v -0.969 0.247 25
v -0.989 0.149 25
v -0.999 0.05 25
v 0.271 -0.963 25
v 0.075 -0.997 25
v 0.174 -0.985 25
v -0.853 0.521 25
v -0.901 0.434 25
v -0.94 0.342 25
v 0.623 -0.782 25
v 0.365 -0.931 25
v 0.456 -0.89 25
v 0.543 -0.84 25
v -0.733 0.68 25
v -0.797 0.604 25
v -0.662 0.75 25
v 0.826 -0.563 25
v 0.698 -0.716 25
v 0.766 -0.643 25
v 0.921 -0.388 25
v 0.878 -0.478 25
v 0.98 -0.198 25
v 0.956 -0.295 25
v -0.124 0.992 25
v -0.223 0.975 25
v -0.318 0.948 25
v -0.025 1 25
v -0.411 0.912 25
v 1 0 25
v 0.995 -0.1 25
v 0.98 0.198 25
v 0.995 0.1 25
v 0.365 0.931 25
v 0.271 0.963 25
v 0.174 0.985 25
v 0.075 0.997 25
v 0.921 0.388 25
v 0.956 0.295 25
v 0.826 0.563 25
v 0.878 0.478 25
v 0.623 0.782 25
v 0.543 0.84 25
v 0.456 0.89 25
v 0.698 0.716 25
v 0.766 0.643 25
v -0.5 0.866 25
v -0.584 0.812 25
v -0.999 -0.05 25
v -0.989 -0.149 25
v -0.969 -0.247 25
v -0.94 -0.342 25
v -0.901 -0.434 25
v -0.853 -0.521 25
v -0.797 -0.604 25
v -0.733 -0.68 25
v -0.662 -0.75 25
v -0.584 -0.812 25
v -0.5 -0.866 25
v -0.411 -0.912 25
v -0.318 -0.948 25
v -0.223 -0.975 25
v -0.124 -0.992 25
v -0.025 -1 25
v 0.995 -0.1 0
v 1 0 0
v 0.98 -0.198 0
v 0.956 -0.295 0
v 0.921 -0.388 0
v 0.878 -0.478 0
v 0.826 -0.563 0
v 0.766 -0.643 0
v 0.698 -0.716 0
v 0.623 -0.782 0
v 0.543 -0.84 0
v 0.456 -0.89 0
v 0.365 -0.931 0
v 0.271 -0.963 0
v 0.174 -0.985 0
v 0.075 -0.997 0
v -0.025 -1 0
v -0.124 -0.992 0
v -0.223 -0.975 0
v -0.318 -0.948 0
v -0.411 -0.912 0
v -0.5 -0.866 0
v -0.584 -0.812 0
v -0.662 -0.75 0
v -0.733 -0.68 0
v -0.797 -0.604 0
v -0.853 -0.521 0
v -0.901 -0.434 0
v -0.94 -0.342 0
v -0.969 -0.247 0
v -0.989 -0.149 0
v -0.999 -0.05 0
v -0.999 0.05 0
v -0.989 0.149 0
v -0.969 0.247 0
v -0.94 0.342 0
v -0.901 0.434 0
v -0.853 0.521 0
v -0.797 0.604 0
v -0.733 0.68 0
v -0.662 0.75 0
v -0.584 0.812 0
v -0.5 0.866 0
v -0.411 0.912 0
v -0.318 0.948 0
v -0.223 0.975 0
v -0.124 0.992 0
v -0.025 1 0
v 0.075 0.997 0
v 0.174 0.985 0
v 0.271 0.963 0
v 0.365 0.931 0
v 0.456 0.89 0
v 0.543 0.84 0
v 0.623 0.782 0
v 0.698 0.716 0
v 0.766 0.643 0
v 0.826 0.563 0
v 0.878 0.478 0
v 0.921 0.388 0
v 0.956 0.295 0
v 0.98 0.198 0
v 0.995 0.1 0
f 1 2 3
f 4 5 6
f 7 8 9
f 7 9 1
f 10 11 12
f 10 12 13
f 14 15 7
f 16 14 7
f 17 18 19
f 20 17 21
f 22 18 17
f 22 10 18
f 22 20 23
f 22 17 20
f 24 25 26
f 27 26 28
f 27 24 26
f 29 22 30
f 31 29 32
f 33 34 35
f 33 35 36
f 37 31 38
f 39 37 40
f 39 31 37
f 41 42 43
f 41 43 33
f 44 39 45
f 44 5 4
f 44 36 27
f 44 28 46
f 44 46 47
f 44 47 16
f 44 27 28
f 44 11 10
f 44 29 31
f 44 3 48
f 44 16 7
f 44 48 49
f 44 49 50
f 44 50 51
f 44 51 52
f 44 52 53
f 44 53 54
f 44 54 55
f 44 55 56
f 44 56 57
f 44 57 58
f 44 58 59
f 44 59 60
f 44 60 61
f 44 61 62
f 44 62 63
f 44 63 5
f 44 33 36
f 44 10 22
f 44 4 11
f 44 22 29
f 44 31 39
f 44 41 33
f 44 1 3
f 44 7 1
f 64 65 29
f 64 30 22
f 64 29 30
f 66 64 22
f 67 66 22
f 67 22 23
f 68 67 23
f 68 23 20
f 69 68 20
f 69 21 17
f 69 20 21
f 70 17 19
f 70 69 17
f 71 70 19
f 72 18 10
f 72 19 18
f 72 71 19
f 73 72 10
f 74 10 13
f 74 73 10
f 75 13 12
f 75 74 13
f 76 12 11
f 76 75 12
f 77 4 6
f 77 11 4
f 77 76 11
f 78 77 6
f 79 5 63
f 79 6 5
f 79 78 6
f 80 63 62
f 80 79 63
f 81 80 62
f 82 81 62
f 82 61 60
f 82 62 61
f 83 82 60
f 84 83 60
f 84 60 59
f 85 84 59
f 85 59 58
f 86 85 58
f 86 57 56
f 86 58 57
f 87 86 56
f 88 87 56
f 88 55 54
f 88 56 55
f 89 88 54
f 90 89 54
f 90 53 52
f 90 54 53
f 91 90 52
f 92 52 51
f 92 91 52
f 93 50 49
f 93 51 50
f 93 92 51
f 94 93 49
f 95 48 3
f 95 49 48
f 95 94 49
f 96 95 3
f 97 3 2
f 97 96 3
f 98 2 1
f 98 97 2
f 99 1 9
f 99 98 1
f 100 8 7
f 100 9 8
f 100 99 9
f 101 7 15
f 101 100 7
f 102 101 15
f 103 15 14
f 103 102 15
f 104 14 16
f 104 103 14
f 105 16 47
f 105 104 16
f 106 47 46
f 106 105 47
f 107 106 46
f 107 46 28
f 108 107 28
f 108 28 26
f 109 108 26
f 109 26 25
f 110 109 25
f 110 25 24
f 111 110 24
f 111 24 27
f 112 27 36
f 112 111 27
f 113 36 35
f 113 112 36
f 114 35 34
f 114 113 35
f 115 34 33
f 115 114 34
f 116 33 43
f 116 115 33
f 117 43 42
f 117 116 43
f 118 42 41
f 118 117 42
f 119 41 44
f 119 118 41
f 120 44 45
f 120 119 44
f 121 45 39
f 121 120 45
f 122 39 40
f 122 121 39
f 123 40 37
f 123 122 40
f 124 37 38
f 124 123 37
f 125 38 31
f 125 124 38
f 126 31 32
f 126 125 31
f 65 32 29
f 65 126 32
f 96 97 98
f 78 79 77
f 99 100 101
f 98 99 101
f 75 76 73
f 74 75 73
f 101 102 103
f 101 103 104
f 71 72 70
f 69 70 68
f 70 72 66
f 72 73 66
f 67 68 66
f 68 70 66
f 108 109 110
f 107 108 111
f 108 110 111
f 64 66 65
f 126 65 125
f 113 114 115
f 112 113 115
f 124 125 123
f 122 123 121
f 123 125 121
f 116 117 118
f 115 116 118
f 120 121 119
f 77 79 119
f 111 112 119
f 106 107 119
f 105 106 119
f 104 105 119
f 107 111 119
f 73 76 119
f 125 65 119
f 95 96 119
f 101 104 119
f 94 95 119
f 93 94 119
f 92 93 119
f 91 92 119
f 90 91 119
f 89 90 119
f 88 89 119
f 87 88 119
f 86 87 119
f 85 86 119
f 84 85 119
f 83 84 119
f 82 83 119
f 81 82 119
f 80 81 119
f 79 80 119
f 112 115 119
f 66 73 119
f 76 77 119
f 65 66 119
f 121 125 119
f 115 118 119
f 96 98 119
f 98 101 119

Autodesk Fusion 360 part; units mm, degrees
sketch "Boceto1" plane through (0, 0, 0) normal (0, 0, 1) x (1, 0, 0)
  line L0 (0, 0) -> (120, 0)
  line L1 (120, 0) -> (120, 50)
  line L2 (120, 50) -> (0, 50)
  line L3 (0, 50) -> (0, 0)
  dimension "d1" = 120
  dimension "d2" = 50
extrude "Extruir1" add sketch "Boceto1" along normal blind 3
sketch "Boceto2" plane through (0, 0, 3) normal (0, 0, 1) x (-1, 0, 0)
  line L0 (0, -50) -> (0, 0)
  line L1 (0, 0) -> (-120, 0)
  line L2 (-120, 0) -> (-120, -50)
  line L3 (-120, -50) -> (0, -50)
  line L4 (-120, -25) -> (0, -25)
  line L5 (-120, -25) -> (-100, -25)
  circle A0 centre (-100, -25) radius 3
  line L6 (-100, -25) -> (-83.13, -25)
  circle A1 centre (-83.13, -25) radius 3
  line L7 (-83.13, -25) -> (-66.26, -25)
  circle A2 centre (-66.26, -25) radius 3
  line L8 (-66.26, -25) -> (-49.39, -25)
  circle A3 centre (-49.39, -25) radius 3
  line L9 (-49.39, -25) -> (-32.52, -25)
  circle A4 centre (-32.52, -25) radius 3
  line L10 (-32.52, -25) -> (-15.65, -25)
  circle A5 centre (-15.65, -25) radius 3
  dimension "d5" = 20
  dimension "d6" = 6
  dimension "d7" = 16.87
  dimension "d8" = 6
  dimension "d9" = 16.87
  dimension "d11" = 6
  dimension "d12" = 16.87
  dimension "d13" = 6
  dimension "d14" = 16.87
  dimension "d15" = 6
  dimension "d16" = 16.87
  dimension "d17" = 6
extrude "Extruir2" cut sketch "Boceto2" against normal blind 3 contours L4 L10 A5 | L4 L10 A5 | L4 L5 A0 L6 | L4 L5 A0 L6 | L4 L9 A4 L10 | L4 L9 A4 L10 | L4 L6 A1 L7 | L4 L6 A1 L7 | L4 L8 A3 L9 | L4 L8 A3 L9 | L4 L7 A2 L8 | L4 L7 A2 L8
equation "d6 = D_b"
equation "d7 = Dc"
equation "d8 = D_b"
equation "d9 = Dc"
equation "Dc = 16.87 mm"
equation "d11 = D_b"
equation "d12 = Dc"
equation "d13 = D_b"
equation "d14 = Dc"
equation "d15 = D_b"
equation "d16 = Dc"
equation "d17 = D_b"
equation "D_b = 6 mm"

Autodesk Fusion 360 part; units mm, degrees
sketch "Boceto1" plane through (0, 0, 0) normal (0, 0, 1) x (1, 0, 0)
  circle A0 centre (0, 0) radius 1
  dimension "d1" = 2
extrude "Extruir1" add sketch "Boceto1" along normal blind 25
